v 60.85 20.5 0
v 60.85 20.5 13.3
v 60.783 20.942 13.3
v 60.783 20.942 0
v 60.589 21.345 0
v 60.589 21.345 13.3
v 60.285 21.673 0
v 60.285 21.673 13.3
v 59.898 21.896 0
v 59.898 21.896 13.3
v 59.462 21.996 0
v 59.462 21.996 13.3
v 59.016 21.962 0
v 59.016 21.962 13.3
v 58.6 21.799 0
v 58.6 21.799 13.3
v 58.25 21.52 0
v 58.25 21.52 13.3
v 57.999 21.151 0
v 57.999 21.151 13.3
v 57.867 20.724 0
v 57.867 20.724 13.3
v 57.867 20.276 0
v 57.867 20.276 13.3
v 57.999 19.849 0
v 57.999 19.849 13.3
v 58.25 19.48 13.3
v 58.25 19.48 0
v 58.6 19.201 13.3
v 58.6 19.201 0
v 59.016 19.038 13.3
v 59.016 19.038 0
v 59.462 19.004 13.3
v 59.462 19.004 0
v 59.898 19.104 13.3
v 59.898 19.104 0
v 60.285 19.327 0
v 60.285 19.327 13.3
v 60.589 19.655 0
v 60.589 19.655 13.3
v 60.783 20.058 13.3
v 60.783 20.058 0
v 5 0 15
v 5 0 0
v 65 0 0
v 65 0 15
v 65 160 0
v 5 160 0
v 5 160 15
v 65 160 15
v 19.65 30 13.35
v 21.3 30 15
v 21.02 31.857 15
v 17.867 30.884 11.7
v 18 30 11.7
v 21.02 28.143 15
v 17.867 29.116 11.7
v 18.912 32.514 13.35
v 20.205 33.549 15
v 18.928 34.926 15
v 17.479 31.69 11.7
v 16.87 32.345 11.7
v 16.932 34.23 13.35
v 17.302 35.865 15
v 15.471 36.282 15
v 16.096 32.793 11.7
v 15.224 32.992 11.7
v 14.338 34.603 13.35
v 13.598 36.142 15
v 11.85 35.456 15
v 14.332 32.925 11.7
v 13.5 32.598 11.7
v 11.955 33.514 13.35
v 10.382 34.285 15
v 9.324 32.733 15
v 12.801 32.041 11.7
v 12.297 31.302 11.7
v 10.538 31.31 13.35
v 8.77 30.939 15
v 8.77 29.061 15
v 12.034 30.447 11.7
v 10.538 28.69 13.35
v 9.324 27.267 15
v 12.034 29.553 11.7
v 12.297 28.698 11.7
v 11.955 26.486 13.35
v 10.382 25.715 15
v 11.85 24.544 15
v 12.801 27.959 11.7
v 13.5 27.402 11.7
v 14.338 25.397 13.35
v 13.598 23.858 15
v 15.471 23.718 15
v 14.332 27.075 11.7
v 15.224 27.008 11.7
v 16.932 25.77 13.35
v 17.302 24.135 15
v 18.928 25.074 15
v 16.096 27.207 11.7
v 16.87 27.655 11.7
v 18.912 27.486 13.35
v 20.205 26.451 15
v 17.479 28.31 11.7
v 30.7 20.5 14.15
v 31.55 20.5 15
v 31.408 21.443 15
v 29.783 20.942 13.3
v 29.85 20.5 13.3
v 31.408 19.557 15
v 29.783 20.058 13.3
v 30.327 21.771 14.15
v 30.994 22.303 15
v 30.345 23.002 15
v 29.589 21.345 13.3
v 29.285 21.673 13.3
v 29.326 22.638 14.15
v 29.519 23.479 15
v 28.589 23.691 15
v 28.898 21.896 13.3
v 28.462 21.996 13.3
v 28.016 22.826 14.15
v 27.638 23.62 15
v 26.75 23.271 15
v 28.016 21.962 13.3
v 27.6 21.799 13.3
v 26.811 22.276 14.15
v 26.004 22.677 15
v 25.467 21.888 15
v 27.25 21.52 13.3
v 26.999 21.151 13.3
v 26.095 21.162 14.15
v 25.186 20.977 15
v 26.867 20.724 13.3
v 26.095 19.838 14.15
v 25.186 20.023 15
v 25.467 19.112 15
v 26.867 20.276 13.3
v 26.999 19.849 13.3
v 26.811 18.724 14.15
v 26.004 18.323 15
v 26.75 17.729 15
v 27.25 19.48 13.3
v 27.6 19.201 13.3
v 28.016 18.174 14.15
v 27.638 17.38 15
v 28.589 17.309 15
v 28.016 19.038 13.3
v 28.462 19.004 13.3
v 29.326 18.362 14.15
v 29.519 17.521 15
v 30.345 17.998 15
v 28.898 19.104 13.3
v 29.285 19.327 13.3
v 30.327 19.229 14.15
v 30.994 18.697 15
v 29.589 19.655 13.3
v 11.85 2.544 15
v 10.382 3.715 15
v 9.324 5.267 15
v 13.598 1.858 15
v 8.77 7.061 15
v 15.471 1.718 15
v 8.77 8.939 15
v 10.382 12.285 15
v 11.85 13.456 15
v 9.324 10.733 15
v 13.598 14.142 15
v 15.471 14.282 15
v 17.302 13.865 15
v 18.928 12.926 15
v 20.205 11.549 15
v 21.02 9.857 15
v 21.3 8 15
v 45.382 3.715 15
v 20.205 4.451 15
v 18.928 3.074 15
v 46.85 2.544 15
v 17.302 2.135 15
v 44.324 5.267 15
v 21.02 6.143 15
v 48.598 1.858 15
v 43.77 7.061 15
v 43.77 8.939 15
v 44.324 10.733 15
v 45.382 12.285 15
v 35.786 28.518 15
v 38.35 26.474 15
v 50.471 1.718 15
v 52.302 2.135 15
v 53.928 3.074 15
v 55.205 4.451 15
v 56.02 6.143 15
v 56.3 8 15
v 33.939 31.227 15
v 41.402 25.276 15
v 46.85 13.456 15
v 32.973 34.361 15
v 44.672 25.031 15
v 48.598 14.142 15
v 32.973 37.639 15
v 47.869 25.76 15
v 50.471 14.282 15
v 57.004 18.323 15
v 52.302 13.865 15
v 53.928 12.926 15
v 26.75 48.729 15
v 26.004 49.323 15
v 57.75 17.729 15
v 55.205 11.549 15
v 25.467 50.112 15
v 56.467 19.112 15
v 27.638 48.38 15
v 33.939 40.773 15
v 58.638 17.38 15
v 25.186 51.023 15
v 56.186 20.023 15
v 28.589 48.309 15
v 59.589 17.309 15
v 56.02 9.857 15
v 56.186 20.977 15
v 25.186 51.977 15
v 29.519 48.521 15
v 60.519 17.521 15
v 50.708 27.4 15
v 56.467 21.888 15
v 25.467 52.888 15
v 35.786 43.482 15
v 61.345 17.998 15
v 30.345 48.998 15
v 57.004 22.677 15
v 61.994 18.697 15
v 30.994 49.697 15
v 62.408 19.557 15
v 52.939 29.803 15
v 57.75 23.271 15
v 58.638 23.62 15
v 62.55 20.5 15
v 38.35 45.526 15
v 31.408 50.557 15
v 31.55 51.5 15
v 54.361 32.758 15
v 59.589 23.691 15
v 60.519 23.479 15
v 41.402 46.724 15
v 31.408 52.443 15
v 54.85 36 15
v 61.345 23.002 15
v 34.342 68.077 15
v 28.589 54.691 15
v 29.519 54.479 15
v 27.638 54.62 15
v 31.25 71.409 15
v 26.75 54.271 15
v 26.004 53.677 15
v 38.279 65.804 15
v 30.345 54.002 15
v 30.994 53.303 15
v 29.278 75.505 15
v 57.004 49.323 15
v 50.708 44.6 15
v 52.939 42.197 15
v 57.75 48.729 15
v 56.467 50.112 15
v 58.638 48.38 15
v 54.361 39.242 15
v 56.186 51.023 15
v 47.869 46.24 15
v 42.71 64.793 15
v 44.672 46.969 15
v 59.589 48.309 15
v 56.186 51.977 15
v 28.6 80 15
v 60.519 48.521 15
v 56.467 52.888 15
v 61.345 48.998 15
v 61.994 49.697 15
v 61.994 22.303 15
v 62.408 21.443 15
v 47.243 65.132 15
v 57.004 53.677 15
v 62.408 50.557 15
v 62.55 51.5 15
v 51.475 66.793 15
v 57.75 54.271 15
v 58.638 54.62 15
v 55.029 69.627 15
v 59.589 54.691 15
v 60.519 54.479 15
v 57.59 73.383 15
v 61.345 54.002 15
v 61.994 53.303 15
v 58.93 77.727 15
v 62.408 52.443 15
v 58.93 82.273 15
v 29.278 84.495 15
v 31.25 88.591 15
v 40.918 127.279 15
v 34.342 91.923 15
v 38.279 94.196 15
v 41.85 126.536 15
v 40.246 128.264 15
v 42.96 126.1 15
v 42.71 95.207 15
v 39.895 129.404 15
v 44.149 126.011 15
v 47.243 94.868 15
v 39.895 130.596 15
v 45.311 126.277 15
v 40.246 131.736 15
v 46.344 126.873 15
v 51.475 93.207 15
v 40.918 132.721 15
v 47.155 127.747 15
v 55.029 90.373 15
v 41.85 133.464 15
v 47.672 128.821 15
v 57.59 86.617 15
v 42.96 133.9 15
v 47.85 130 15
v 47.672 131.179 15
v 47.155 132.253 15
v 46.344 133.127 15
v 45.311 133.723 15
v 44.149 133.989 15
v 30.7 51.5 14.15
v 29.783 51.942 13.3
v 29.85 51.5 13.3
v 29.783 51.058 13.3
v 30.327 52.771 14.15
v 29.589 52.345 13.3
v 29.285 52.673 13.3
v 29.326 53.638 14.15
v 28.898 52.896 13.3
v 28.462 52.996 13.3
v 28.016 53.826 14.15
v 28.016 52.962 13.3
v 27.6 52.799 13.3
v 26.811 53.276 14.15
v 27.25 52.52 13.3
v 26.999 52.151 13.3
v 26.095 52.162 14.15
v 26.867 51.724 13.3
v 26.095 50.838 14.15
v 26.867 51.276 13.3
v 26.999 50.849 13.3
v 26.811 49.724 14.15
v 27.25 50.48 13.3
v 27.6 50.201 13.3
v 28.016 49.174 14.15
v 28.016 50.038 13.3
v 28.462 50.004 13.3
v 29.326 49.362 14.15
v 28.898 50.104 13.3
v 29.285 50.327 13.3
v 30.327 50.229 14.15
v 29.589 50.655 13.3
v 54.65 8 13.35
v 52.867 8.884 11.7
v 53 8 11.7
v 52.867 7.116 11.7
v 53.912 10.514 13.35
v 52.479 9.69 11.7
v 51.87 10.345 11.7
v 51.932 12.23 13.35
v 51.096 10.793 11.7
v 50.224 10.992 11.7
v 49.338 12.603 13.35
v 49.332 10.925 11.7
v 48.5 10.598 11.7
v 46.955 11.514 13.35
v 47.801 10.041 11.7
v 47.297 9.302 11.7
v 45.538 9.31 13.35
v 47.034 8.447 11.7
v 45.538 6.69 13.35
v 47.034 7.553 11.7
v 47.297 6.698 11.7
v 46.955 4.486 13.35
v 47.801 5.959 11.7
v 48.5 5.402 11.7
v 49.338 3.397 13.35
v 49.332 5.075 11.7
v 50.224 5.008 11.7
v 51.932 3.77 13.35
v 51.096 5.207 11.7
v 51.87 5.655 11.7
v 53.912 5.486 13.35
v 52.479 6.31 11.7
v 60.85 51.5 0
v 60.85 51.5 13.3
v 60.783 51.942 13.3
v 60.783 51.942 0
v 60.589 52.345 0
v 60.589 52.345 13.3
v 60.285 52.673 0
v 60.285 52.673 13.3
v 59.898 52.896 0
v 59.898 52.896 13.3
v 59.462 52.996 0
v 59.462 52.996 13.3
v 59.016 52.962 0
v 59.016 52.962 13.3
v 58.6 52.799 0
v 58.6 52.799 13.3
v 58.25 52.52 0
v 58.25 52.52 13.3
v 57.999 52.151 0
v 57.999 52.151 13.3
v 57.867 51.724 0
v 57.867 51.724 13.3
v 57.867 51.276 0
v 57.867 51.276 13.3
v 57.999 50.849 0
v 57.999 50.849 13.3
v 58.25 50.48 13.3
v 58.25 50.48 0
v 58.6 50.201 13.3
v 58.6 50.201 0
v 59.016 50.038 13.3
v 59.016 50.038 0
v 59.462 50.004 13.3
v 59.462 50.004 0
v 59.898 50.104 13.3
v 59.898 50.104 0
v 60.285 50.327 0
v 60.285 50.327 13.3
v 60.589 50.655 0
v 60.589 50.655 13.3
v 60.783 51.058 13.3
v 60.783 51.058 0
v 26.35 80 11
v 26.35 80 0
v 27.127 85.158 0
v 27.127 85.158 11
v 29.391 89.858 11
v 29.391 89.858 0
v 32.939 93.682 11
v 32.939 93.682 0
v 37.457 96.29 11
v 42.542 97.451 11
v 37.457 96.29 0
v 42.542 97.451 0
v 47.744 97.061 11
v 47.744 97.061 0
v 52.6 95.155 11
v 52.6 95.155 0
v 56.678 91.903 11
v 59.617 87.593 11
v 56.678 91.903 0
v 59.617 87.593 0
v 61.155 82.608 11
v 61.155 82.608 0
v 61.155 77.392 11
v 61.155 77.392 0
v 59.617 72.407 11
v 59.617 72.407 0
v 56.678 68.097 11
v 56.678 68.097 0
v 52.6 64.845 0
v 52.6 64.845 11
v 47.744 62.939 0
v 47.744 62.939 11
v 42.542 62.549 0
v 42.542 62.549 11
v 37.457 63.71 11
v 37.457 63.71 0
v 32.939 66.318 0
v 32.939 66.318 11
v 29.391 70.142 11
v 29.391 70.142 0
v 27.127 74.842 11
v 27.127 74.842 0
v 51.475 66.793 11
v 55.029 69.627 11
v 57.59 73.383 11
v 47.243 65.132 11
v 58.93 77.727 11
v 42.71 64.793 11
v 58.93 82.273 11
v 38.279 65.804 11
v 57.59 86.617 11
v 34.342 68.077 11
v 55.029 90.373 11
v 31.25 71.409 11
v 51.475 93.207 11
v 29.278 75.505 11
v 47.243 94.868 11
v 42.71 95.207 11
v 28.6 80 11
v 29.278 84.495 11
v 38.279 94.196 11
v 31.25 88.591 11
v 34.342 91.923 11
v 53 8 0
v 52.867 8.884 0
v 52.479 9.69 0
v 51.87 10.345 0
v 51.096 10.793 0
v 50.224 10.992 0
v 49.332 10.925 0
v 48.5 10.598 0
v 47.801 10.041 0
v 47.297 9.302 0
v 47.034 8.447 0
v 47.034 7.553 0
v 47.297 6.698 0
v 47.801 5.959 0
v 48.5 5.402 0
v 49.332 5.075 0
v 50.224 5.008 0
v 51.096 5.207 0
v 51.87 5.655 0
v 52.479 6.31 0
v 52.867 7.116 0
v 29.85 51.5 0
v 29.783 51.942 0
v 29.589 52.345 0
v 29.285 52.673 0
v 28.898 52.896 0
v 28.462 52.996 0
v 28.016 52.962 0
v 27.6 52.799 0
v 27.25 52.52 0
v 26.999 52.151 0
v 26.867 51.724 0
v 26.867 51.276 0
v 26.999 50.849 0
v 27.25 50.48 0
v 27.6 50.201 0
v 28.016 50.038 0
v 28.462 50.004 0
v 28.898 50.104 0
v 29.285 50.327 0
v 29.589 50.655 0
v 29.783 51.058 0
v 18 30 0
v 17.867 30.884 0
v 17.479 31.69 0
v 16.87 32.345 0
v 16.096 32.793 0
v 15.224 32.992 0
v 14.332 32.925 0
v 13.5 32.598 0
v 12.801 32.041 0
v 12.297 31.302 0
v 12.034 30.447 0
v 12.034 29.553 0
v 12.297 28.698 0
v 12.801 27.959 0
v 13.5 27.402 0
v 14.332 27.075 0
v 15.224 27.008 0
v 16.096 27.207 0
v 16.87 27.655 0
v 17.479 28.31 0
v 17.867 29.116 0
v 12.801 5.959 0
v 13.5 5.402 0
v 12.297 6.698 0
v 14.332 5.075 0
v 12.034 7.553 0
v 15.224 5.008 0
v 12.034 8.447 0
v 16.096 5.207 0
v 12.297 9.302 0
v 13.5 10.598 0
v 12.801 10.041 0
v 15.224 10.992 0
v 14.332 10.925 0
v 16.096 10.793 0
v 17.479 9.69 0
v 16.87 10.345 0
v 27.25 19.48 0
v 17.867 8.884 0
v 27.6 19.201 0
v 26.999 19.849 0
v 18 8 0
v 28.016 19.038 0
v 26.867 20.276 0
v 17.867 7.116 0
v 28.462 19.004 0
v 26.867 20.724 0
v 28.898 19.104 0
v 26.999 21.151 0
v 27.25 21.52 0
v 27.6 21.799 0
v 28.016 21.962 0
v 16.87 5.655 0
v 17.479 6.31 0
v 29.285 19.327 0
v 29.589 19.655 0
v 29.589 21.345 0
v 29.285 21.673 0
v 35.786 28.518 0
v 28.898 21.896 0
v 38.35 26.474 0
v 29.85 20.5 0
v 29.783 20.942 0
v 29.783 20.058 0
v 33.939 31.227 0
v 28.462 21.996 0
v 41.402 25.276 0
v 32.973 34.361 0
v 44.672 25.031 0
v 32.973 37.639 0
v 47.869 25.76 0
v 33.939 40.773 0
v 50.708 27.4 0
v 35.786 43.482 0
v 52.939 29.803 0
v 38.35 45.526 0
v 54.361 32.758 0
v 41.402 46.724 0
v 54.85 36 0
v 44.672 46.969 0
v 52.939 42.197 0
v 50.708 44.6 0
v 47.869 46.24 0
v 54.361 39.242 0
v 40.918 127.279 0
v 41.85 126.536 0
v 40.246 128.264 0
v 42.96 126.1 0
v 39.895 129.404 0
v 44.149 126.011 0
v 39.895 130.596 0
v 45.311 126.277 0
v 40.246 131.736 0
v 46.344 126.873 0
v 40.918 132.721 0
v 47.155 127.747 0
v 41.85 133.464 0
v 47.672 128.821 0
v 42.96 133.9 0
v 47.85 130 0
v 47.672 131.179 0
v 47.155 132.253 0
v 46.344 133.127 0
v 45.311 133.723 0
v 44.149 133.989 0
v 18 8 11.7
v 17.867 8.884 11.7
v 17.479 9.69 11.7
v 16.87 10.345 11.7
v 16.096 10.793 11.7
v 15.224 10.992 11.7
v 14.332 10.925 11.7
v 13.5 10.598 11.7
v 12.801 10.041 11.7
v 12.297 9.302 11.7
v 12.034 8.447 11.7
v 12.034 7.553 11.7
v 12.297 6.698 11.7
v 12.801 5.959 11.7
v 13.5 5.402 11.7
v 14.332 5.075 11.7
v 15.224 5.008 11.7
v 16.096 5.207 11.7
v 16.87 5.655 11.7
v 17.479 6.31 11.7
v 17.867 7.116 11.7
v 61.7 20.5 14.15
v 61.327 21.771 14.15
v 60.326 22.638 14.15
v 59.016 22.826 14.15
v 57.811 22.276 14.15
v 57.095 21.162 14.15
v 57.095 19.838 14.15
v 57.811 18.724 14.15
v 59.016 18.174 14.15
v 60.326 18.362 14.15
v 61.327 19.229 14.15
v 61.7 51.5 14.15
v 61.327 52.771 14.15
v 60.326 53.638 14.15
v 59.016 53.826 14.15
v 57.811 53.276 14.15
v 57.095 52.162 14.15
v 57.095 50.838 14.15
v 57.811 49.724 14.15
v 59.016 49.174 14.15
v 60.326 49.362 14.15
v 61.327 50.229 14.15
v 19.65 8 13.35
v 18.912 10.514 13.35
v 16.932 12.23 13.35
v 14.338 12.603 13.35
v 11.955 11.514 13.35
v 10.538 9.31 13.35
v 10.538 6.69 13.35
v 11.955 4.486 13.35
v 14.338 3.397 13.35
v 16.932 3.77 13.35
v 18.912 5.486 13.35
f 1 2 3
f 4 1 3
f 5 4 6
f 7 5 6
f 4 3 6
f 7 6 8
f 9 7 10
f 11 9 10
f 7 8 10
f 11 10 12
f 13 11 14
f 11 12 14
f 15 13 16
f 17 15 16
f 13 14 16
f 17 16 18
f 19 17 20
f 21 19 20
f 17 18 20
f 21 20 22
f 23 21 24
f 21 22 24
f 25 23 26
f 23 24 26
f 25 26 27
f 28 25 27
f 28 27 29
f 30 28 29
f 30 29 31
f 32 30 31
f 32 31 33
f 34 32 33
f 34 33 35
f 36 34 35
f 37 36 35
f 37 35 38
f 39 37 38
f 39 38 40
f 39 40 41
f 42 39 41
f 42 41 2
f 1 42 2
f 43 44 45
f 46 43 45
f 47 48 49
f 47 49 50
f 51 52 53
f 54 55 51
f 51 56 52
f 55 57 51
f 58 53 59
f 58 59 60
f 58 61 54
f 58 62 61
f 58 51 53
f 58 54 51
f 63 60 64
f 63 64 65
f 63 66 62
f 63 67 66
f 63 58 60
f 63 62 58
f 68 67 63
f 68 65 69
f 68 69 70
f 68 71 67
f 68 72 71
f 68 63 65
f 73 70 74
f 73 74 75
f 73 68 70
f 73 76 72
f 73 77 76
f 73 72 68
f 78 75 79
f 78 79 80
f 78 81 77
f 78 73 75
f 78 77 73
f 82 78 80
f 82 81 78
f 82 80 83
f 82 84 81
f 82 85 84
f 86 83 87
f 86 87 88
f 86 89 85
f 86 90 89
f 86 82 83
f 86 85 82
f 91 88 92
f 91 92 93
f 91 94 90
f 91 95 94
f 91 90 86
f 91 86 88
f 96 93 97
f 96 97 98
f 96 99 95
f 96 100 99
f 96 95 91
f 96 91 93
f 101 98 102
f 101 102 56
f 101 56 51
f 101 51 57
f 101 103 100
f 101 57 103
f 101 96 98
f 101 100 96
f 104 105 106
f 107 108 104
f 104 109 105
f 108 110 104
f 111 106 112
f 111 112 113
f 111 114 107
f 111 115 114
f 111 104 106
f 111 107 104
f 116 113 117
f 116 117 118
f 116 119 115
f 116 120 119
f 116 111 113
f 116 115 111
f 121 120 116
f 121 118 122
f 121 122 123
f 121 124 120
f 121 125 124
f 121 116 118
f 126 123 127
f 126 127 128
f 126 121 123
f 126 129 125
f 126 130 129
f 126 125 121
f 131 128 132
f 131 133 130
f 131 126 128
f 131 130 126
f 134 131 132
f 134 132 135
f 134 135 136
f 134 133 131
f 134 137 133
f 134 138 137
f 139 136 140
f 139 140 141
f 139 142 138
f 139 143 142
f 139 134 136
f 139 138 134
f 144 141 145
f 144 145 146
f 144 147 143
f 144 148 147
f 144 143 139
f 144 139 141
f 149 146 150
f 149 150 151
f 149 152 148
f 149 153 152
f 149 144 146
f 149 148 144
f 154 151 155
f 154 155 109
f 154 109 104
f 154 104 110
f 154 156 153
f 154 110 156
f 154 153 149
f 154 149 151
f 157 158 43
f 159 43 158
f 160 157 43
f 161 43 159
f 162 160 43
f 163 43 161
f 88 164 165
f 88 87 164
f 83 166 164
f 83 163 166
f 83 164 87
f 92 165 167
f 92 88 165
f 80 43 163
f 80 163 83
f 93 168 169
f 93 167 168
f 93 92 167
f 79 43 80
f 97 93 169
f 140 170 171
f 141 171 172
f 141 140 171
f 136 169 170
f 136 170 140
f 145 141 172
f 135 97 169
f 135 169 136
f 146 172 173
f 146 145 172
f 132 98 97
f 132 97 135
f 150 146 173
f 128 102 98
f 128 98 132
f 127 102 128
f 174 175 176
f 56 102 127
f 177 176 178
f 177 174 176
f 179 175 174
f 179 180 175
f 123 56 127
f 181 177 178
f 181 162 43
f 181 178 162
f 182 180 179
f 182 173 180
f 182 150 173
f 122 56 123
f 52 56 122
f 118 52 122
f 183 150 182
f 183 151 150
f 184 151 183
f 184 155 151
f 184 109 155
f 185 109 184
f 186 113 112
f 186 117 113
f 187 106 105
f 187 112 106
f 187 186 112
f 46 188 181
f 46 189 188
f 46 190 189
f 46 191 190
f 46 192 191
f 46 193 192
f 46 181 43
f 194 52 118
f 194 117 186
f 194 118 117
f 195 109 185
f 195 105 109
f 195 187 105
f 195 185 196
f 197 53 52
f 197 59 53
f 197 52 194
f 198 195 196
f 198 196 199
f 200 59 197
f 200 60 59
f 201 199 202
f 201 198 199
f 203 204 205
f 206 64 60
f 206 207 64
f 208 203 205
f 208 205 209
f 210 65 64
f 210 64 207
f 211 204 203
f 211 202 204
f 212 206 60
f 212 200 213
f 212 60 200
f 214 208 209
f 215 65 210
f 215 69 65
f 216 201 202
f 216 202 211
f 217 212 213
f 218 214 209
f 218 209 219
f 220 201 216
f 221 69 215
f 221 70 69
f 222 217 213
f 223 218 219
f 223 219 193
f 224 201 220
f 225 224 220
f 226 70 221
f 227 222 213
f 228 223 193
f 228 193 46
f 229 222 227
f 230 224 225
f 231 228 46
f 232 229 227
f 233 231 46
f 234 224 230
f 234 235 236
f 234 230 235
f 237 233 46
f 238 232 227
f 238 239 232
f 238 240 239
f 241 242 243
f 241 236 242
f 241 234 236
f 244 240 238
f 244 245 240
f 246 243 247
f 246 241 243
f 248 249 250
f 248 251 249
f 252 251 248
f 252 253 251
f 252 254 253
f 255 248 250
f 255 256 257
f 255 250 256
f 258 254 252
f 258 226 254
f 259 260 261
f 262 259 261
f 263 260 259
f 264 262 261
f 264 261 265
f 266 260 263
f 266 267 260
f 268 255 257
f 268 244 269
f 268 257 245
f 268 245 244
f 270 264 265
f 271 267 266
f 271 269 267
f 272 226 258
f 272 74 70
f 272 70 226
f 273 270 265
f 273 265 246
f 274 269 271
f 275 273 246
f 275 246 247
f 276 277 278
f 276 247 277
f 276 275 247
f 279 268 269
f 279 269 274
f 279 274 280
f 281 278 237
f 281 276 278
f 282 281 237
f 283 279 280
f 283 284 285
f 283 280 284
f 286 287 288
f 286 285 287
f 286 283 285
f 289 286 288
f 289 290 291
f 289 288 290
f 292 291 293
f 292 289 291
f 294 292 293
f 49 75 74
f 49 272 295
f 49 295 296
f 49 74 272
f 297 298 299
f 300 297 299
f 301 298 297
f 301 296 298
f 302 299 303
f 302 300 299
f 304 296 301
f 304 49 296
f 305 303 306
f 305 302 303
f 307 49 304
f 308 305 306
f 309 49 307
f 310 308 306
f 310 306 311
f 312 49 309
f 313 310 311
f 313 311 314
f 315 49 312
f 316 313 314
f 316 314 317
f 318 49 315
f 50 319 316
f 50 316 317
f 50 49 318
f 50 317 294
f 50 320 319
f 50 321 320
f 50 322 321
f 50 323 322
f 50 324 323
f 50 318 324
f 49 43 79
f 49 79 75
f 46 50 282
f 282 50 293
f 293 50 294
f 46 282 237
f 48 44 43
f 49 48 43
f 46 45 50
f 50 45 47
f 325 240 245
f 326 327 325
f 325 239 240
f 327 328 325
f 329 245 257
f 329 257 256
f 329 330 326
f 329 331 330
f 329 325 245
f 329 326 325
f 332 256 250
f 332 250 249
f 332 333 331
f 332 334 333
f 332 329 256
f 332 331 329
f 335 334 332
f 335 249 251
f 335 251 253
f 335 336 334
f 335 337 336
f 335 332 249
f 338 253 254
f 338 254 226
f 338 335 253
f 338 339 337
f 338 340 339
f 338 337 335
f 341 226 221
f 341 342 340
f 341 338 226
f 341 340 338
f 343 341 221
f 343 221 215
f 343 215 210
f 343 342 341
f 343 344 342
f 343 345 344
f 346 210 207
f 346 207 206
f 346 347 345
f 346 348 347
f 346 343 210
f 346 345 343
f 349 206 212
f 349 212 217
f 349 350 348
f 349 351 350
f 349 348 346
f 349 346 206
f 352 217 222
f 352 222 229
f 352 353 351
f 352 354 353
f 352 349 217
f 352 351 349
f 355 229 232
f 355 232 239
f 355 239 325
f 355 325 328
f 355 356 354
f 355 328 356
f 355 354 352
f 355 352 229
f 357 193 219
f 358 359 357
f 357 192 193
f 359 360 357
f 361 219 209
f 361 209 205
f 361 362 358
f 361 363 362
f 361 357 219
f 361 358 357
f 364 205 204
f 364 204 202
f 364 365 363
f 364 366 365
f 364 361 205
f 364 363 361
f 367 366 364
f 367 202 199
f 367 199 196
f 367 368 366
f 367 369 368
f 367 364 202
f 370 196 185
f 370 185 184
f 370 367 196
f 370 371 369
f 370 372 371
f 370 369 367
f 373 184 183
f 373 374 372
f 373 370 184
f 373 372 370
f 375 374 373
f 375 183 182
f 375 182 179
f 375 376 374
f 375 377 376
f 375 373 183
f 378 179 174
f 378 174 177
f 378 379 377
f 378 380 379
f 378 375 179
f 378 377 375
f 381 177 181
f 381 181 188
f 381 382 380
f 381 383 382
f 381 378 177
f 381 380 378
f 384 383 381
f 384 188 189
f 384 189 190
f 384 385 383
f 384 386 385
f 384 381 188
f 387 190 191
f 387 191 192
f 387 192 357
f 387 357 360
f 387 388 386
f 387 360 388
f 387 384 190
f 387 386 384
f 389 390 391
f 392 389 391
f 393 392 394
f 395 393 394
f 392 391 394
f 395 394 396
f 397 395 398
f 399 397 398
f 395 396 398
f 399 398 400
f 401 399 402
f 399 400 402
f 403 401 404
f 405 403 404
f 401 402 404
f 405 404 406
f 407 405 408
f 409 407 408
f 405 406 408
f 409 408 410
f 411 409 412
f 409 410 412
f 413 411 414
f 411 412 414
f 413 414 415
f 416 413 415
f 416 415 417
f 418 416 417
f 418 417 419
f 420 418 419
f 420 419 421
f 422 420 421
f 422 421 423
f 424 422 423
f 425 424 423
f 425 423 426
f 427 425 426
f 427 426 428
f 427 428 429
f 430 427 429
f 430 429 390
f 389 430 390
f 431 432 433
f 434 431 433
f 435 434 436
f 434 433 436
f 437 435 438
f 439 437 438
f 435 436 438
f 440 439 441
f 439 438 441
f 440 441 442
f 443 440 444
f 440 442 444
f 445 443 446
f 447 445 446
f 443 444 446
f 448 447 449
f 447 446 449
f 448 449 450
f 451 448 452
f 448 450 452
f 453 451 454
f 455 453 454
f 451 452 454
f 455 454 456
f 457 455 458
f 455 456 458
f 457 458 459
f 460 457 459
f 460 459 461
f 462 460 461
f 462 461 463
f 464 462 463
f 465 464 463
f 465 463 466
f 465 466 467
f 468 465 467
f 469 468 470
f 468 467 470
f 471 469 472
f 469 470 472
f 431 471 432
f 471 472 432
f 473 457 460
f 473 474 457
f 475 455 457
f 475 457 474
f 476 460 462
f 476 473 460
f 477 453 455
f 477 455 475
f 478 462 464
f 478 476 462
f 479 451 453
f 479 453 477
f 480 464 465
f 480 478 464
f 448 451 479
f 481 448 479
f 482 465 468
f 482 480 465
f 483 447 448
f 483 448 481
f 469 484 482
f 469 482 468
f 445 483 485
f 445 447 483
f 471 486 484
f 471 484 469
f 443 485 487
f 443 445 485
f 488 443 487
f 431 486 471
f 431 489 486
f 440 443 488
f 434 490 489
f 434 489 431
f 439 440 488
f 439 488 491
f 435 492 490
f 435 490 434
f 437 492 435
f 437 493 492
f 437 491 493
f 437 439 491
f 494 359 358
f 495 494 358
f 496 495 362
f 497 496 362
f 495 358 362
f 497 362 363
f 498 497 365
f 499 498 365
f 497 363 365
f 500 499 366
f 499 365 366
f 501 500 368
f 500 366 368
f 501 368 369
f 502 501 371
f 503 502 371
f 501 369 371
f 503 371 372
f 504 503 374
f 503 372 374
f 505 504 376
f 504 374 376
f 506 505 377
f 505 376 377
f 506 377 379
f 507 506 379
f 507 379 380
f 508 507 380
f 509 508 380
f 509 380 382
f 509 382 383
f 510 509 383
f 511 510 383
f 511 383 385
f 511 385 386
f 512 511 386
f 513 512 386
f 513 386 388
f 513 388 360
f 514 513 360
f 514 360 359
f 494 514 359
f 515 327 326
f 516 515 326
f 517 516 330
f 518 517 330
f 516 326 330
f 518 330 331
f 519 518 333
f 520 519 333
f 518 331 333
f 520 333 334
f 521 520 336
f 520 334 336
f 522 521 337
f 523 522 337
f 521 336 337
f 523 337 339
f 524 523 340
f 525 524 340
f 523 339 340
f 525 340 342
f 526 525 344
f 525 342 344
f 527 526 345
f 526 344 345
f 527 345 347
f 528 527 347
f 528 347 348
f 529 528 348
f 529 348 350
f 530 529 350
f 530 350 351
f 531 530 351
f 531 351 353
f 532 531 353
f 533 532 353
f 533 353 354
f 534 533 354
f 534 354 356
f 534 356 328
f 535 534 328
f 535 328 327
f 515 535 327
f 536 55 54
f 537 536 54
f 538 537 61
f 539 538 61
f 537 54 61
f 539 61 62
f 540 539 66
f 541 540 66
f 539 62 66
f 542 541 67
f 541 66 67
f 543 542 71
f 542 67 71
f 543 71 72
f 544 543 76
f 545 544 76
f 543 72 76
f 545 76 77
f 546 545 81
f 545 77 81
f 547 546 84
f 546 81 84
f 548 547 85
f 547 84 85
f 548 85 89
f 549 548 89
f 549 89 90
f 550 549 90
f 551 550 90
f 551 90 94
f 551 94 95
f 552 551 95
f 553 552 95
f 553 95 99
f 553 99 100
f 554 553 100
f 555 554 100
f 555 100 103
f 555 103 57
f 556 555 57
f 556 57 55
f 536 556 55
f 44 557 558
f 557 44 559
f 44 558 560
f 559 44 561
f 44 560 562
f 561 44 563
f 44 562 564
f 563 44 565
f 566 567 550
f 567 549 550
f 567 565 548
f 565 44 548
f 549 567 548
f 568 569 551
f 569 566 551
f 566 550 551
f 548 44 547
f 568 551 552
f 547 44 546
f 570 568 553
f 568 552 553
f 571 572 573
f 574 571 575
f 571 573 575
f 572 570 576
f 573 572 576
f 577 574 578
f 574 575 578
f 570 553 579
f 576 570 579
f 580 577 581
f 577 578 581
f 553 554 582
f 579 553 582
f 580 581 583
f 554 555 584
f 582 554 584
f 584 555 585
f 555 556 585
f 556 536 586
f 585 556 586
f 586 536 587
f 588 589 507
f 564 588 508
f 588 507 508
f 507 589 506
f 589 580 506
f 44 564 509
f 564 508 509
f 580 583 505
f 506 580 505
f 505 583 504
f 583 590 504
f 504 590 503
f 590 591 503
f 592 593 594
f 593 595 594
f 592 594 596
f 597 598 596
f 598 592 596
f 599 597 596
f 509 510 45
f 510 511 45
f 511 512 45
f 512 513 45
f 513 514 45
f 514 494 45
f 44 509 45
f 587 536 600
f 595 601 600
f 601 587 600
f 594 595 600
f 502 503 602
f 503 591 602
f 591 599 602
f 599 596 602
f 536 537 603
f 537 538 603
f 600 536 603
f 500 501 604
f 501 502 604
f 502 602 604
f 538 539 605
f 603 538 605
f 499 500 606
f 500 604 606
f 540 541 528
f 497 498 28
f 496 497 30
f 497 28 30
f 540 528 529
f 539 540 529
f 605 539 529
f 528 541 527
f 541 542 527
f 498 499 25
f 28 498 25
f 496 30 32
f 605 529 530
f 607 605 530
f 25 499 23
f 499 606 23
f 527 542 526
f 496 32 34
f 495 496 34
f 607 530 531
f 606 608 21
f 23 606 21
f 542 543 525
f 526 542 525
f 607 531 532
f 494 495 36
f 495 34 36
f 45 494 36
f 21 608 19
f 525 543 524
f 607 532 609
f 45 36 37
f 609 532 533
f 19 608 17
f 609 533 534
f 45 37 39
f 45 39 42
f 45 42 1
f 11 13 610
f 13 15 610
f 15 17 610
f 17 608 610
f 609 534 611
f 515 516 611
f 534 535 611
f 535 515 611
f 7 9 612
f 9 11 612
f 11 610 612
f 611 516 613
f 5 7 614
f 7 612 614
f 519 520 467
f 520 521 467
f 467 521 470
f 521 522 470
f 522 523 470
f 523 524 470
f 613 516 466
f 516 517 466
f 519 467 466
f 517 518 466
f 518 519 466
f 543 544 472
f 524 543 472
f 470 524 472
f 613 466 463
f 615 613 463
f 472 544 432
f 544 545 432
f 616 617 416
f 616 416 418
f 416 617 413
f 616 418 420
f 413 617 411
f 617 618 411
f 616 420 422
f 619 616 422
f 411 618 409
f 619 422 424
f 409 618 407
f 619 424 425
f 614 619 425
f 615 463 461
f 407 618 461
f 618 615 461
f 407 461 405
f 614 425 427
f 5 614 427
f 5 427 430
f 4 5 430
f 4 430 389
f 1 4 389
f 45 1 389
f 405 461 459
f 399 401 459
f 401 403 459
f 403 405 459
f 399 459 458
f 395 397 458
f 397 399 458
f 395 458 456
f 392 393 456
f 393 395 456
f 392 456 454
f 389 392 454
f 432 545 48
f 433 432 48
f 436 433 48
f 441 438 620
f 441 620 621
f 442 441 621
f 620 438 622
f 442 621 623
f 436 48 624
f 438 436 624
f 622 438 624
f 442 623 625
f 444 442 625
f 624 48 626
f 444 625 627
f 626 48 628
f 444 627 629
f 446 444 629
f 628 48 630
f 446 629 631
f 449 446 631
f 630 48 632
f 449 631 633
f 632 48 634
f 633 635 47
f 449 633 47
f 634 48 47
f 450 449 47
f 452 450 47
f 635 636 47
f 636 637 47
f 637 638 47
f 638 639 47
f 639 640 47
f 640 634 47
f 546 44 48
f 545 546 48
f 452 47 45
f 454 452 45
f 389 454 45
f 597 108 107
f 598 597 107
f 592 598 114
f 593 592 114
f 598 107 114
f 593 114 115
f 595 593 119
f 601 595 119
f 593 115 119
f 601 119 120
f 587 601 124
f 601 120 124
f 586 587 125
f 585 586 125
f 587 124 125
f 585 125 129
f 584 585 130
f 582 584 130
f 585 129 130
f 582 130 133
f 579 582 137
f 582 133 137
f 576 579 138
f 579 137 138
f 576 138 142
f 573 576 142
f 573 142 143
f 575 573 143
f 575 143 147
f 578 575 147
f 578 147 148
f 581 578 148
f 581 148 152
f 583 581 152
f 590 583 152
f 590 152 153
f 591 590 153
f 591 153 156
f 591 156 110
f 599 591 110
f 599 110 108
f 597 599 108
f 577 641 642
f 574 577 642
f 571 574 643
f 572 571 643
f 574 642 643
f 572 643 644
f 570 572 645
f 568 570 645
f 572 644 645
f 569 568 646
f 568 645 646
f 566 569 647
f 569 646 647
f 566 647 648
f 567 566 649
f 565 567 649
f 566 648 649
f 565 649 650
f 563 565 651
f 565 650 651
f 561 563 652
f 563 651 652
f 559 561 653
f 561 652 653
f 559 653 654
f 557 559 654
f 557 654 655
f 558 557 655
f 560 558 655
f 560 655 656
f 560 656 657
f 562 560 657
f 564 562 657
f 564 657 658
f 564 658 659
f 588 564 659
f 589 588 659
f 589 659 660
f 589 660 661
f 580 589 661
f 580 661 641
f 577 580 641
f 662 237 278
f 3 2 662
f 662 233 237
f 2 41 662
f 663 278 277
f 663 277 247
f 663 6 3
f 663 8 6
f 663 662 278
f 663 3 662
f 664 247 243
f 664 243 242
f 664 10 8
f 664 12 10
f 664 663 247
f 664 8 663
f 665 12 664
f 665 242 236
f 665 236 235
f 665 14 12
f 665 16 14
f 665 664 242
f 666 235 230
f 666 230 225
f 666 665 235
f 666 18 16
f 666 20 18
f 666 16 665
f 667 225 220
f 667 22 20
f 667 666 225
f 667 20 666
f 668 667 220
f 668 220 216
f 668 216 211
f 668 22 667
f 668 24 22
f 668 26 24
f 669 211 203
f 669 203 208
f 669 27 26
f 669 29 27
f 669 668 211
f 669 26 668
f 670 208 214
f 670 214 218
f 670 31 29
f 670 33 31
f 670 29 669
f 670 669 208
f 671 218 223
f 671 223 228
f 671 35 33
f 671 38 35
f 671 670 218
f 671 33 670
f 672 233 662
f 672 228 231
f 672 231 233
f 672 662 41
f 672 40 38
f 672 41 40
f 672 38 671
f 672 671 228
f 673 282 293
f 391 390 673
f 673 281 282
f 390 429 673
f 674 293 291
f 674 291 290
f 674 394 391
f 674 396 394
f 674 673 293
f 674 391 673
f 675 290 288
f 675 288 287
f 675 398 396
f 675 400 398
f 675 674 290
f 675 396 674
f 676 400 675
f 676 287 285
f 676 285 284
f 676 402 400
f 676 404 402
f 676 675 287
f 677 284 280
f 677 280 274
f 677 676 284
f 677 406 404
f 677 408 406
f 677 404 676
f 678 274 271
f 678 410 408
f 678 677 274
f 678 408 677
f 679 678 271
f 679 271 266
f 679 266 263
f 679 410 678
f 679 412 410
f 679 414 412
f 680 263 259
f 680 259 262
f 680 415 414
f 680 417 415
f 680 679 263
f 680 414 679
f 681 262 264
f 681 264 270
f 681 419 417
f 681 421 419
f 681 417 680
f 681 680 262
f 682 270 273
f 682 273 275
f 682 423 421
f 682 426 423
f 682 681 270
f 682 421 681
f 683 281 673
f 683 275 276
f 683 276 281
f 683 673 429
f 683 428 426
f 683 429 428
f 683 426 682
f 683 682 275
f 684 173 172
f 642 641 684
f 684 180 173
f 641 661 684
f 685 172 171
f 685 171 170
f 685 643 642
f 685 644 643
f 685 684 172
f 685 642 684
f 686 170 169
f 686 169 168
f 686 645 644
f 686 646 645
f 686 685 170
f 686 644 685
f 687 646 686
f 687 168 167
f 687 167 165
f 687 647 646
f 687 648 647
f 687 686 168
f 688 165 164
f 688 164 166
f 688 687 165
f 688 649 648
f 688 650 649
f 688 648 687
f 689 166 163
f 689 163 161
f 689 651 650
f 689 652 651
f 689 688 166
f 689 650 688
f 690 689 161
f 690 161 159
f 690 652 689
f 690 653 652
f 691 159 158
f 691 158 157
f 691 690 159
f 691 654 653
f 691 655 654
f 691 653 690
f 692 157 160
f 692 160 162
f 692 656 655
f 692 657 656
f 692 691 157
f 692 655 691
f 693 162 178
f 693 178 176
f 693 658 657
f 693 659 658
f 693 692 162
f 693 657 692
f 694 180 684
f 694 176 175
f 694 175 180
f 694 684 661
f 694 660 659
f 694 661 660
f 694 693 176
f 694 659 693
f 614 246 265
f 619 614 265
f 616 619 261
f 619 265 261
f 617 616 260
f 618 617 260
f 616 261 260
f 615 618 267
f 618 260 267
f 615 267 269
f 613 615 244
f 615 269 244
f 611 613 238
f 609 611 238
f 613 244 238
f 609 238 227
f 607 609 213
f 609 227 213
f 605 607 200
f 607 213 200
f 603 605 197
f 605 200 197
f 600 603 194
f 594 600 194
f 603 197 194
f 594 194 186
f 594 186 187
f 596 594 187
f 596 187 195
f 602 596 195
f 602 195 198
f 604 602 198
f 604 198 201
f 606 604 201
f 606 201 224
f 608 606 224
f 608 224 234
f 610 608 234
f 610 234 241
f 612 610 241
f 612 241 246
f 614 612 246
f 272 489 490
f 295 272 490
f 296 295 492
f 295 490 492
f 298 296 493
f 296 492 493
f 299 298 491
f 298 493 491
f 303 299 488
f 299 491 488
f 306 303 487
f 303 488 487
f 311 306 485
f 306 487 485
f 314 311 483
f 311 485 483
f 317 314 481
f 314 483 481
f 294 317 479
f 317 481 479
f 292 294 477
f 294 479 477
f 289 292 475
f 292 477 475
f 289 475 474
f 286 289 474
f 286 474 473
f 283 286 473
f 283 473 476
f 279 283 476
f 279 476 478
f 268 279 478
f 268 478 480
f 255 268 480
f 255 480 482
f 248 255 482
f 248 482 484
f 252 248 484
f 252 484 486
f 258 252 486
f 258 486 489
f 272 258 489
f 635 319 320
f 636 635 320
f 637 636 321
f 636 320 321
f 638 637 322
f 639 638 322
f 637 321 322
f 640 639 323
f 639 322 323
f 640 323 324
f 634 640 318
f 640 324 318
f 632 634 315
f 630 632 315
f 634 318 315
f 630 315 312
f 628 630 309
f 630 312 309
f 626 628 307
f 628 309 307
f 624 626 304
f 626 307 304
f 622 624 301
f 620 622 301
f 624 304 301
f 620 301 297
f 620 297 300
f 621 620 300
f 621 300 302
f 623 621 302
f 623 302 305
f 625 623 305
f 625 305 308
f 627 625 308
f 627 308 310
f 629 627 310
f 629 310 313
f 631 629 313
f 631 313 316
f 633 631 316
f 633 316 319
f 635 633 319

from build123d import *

# Parameters (mm, degrees)
SKIZZE1_W                        = 65
SKIZZE1_H                        = 160
AUFSATZ_LINEAR_AUSTRAGEN1_DEPTH  = 15
SKIZZE2_R                        = 17.5
SCHNITT_LINEAR_AUSTRAGEN1_DEPTH  = 11
SKIZZE4_R                        = 15.25
SCHNITT_LINEAR_AUSTRAGEN3_DEPTH  = 10
SKIZZE5_R                        = 11
SCHNITT_LINEAR_AUSTRAGEN4_DEPTH  = 20
SKIZZE7_R                        = 3
SCHNITT_LINEAR_AUSTRAGEN6_DEPTH  = 17
FASE1_SIZE                       = 3.3
SKIZZE10_R                       = 3
SCHNITT_LINEAR_AUSTRAGEN9_DEPTH  = 29
FASE2_SIZE                       = 3.3
SKIZZE11_R                       = 1.5
SCHNITT_LINEAR_AUSTRAGEN10_DEPTH = 44
FASE3_SIZE                       = 1.7
SKIZZE13_R                       = 4
SCHNITT_LINEAR_AUSTRAGEN12_DEPTH = 35
SKIZZE14_W                       = 15
SKIZZE14_H                       = 160
SCHNITT_LINEAR_AUSTRAGEN13_DEPTH = 5


with BuildPart() as part:
    # Skizze1 → Aufsatz-Linear austragen1 (new body)
    with BuildSketch(Plane.XY):
        with Locations((32.5, 80)):
            Rectangle(SKIZZE1_W, SKIZZE1_H)
    extrude(amount=AUFSATZ_LINEAR_AUSTRAGEN1_DEPTH)

    # Skizze2 → Schnitt-Linear austragen1 (cut)
    with BuildSketch(Plane(origin=(0, 0, 0), x_dir=(-1, 0, 0), z_dir=(0, 0, -1))):
        with Locations((-43.85, 80)):
            Circle(SKIZZE2_R)
    extrude(amount=-SCHNITT_LINEAR_AUSTRAGEN1_DEPTH, mode=Mode.SUBTRACT)

    # Skizze4 → Schnitt-Linear austragen3 (cut)
    with BuildSketch(Plane(origin=(0, 0, 11), x_dir=(-1, 0, 0), z_dir=(0, 0, -1))):
        with Locations((-43.85, 80)):
            Circle(SKIZZE4_R)
    extrude(amount=-SCHNITT_LINEAR_AUSTRAGEN3_DEPTH, mode=Mode.SUBTRACT)

    # Skizze5 → Schnitt-Linear austragen4 (cut)
    with BuildSketch(Plane.XY.offset(15)):
        with Locations((43.85, 36)):
            Circle(SKIZZE5_R)
    extrude(amount=-SCHNITT_LINEAR_AUSTRAGEN4_DEPTH, mode=Mode.SUBTRACT)

    # Skizze7 → Schnitt-Linear austragen6 (cut)
    with BuildSketch(Plane.XY.offset(15)):
        with Locations((15, 8)):
            Circle(SKIZZE7_R)
        with Locations((50, 8)):
            Circle(SKIZZE7_R)
    extrude(amount=-SCHNITT_LINEAR_AUSTRAGEN6_DEPTH, mode=Mode.SUBTRACT)

    # Fase1
    fase1_edges = [part.edges().sort_by_distance(p)[0] for p in [
        (12, 8, 15),
        (47, 8, 15),
    ]]
    chamfer(fase1_edges, length=FASE1_SIZE)

    # Skizze10 → Schnitt-Linear austragen9 (cut)
    with BuildSketch(Plane.XY.offset(15)):
        with Locations((15, 30)):
            Circle(SKIZZE10_R)
    extrude(amount=-SCHNITT_LINEAR_AUSTRAGEN9_DEPTH, mode=Mode.SUBTRACT)

    # Fase2
    fase2_edges = [part.edges().sort_by_distance(p)[0] for p in [
        (12, 30, 15),
    ]]
    chamfer(fase2_edges, length=FASE2_SIZE)

    # Skizze11 → Schnitt-Linear austragen10 (cut)
    with BuildSketch(Plane.XY.offset(15)):
        with Locations((59.35, 51.5)):
            Circle(SKIZZE11_R)
        with Locations((59.35, 20.5)):
            Circle(SKIZZE11_R)
        with Locations((28.35, 51.5)):
            Circle(SKIZZE11_R)
        with Locations((28.35, 20.5)):
            Circle(SKIZZE11_R)
    extrude(amount=-SCHNITT_LINEAR_AUSTRAGEN10_DEPTH, mode=Mode.SUBTRACT)

    # Fase3
    fase3_edges = [part.edges().sort_by_distance(p)[0] for p in [
        (57.85, 51.5, 15),
        (57.85, 20.5, 15),
        (26.85, 51.5, 15),
        (26.85, 20.5, 15),
    ]]
    chamfer(fase3_edges, length=FASE3_SIZE)

    # Skizze13 → Schnitt-Linear austragen12 (cut)
    with BuildSketch(Plane.XY.offset(15)):
        with Locations((43.85, 130)):
            Circle(SKIZZE13_R)
    extrude(amount=-SCHNITT_LINEAR_AUSTRAGEN12_DEPTH, mode=Mode.SUBTRACT)

    # Skizze14 → Schnitt-Linear austragen13 (cut)
    with BuildSketch(Plane.ZY):
        with Locations((7.5, 80)):
            Rectangle(SKIZZE14_W, SKIZZE14_H)
    extrude(amount=-SCHNITT_LINEAR_AUSTRAGEN13_DEPTH, mode=Mode.SUBTRACT)


solid = part.part
